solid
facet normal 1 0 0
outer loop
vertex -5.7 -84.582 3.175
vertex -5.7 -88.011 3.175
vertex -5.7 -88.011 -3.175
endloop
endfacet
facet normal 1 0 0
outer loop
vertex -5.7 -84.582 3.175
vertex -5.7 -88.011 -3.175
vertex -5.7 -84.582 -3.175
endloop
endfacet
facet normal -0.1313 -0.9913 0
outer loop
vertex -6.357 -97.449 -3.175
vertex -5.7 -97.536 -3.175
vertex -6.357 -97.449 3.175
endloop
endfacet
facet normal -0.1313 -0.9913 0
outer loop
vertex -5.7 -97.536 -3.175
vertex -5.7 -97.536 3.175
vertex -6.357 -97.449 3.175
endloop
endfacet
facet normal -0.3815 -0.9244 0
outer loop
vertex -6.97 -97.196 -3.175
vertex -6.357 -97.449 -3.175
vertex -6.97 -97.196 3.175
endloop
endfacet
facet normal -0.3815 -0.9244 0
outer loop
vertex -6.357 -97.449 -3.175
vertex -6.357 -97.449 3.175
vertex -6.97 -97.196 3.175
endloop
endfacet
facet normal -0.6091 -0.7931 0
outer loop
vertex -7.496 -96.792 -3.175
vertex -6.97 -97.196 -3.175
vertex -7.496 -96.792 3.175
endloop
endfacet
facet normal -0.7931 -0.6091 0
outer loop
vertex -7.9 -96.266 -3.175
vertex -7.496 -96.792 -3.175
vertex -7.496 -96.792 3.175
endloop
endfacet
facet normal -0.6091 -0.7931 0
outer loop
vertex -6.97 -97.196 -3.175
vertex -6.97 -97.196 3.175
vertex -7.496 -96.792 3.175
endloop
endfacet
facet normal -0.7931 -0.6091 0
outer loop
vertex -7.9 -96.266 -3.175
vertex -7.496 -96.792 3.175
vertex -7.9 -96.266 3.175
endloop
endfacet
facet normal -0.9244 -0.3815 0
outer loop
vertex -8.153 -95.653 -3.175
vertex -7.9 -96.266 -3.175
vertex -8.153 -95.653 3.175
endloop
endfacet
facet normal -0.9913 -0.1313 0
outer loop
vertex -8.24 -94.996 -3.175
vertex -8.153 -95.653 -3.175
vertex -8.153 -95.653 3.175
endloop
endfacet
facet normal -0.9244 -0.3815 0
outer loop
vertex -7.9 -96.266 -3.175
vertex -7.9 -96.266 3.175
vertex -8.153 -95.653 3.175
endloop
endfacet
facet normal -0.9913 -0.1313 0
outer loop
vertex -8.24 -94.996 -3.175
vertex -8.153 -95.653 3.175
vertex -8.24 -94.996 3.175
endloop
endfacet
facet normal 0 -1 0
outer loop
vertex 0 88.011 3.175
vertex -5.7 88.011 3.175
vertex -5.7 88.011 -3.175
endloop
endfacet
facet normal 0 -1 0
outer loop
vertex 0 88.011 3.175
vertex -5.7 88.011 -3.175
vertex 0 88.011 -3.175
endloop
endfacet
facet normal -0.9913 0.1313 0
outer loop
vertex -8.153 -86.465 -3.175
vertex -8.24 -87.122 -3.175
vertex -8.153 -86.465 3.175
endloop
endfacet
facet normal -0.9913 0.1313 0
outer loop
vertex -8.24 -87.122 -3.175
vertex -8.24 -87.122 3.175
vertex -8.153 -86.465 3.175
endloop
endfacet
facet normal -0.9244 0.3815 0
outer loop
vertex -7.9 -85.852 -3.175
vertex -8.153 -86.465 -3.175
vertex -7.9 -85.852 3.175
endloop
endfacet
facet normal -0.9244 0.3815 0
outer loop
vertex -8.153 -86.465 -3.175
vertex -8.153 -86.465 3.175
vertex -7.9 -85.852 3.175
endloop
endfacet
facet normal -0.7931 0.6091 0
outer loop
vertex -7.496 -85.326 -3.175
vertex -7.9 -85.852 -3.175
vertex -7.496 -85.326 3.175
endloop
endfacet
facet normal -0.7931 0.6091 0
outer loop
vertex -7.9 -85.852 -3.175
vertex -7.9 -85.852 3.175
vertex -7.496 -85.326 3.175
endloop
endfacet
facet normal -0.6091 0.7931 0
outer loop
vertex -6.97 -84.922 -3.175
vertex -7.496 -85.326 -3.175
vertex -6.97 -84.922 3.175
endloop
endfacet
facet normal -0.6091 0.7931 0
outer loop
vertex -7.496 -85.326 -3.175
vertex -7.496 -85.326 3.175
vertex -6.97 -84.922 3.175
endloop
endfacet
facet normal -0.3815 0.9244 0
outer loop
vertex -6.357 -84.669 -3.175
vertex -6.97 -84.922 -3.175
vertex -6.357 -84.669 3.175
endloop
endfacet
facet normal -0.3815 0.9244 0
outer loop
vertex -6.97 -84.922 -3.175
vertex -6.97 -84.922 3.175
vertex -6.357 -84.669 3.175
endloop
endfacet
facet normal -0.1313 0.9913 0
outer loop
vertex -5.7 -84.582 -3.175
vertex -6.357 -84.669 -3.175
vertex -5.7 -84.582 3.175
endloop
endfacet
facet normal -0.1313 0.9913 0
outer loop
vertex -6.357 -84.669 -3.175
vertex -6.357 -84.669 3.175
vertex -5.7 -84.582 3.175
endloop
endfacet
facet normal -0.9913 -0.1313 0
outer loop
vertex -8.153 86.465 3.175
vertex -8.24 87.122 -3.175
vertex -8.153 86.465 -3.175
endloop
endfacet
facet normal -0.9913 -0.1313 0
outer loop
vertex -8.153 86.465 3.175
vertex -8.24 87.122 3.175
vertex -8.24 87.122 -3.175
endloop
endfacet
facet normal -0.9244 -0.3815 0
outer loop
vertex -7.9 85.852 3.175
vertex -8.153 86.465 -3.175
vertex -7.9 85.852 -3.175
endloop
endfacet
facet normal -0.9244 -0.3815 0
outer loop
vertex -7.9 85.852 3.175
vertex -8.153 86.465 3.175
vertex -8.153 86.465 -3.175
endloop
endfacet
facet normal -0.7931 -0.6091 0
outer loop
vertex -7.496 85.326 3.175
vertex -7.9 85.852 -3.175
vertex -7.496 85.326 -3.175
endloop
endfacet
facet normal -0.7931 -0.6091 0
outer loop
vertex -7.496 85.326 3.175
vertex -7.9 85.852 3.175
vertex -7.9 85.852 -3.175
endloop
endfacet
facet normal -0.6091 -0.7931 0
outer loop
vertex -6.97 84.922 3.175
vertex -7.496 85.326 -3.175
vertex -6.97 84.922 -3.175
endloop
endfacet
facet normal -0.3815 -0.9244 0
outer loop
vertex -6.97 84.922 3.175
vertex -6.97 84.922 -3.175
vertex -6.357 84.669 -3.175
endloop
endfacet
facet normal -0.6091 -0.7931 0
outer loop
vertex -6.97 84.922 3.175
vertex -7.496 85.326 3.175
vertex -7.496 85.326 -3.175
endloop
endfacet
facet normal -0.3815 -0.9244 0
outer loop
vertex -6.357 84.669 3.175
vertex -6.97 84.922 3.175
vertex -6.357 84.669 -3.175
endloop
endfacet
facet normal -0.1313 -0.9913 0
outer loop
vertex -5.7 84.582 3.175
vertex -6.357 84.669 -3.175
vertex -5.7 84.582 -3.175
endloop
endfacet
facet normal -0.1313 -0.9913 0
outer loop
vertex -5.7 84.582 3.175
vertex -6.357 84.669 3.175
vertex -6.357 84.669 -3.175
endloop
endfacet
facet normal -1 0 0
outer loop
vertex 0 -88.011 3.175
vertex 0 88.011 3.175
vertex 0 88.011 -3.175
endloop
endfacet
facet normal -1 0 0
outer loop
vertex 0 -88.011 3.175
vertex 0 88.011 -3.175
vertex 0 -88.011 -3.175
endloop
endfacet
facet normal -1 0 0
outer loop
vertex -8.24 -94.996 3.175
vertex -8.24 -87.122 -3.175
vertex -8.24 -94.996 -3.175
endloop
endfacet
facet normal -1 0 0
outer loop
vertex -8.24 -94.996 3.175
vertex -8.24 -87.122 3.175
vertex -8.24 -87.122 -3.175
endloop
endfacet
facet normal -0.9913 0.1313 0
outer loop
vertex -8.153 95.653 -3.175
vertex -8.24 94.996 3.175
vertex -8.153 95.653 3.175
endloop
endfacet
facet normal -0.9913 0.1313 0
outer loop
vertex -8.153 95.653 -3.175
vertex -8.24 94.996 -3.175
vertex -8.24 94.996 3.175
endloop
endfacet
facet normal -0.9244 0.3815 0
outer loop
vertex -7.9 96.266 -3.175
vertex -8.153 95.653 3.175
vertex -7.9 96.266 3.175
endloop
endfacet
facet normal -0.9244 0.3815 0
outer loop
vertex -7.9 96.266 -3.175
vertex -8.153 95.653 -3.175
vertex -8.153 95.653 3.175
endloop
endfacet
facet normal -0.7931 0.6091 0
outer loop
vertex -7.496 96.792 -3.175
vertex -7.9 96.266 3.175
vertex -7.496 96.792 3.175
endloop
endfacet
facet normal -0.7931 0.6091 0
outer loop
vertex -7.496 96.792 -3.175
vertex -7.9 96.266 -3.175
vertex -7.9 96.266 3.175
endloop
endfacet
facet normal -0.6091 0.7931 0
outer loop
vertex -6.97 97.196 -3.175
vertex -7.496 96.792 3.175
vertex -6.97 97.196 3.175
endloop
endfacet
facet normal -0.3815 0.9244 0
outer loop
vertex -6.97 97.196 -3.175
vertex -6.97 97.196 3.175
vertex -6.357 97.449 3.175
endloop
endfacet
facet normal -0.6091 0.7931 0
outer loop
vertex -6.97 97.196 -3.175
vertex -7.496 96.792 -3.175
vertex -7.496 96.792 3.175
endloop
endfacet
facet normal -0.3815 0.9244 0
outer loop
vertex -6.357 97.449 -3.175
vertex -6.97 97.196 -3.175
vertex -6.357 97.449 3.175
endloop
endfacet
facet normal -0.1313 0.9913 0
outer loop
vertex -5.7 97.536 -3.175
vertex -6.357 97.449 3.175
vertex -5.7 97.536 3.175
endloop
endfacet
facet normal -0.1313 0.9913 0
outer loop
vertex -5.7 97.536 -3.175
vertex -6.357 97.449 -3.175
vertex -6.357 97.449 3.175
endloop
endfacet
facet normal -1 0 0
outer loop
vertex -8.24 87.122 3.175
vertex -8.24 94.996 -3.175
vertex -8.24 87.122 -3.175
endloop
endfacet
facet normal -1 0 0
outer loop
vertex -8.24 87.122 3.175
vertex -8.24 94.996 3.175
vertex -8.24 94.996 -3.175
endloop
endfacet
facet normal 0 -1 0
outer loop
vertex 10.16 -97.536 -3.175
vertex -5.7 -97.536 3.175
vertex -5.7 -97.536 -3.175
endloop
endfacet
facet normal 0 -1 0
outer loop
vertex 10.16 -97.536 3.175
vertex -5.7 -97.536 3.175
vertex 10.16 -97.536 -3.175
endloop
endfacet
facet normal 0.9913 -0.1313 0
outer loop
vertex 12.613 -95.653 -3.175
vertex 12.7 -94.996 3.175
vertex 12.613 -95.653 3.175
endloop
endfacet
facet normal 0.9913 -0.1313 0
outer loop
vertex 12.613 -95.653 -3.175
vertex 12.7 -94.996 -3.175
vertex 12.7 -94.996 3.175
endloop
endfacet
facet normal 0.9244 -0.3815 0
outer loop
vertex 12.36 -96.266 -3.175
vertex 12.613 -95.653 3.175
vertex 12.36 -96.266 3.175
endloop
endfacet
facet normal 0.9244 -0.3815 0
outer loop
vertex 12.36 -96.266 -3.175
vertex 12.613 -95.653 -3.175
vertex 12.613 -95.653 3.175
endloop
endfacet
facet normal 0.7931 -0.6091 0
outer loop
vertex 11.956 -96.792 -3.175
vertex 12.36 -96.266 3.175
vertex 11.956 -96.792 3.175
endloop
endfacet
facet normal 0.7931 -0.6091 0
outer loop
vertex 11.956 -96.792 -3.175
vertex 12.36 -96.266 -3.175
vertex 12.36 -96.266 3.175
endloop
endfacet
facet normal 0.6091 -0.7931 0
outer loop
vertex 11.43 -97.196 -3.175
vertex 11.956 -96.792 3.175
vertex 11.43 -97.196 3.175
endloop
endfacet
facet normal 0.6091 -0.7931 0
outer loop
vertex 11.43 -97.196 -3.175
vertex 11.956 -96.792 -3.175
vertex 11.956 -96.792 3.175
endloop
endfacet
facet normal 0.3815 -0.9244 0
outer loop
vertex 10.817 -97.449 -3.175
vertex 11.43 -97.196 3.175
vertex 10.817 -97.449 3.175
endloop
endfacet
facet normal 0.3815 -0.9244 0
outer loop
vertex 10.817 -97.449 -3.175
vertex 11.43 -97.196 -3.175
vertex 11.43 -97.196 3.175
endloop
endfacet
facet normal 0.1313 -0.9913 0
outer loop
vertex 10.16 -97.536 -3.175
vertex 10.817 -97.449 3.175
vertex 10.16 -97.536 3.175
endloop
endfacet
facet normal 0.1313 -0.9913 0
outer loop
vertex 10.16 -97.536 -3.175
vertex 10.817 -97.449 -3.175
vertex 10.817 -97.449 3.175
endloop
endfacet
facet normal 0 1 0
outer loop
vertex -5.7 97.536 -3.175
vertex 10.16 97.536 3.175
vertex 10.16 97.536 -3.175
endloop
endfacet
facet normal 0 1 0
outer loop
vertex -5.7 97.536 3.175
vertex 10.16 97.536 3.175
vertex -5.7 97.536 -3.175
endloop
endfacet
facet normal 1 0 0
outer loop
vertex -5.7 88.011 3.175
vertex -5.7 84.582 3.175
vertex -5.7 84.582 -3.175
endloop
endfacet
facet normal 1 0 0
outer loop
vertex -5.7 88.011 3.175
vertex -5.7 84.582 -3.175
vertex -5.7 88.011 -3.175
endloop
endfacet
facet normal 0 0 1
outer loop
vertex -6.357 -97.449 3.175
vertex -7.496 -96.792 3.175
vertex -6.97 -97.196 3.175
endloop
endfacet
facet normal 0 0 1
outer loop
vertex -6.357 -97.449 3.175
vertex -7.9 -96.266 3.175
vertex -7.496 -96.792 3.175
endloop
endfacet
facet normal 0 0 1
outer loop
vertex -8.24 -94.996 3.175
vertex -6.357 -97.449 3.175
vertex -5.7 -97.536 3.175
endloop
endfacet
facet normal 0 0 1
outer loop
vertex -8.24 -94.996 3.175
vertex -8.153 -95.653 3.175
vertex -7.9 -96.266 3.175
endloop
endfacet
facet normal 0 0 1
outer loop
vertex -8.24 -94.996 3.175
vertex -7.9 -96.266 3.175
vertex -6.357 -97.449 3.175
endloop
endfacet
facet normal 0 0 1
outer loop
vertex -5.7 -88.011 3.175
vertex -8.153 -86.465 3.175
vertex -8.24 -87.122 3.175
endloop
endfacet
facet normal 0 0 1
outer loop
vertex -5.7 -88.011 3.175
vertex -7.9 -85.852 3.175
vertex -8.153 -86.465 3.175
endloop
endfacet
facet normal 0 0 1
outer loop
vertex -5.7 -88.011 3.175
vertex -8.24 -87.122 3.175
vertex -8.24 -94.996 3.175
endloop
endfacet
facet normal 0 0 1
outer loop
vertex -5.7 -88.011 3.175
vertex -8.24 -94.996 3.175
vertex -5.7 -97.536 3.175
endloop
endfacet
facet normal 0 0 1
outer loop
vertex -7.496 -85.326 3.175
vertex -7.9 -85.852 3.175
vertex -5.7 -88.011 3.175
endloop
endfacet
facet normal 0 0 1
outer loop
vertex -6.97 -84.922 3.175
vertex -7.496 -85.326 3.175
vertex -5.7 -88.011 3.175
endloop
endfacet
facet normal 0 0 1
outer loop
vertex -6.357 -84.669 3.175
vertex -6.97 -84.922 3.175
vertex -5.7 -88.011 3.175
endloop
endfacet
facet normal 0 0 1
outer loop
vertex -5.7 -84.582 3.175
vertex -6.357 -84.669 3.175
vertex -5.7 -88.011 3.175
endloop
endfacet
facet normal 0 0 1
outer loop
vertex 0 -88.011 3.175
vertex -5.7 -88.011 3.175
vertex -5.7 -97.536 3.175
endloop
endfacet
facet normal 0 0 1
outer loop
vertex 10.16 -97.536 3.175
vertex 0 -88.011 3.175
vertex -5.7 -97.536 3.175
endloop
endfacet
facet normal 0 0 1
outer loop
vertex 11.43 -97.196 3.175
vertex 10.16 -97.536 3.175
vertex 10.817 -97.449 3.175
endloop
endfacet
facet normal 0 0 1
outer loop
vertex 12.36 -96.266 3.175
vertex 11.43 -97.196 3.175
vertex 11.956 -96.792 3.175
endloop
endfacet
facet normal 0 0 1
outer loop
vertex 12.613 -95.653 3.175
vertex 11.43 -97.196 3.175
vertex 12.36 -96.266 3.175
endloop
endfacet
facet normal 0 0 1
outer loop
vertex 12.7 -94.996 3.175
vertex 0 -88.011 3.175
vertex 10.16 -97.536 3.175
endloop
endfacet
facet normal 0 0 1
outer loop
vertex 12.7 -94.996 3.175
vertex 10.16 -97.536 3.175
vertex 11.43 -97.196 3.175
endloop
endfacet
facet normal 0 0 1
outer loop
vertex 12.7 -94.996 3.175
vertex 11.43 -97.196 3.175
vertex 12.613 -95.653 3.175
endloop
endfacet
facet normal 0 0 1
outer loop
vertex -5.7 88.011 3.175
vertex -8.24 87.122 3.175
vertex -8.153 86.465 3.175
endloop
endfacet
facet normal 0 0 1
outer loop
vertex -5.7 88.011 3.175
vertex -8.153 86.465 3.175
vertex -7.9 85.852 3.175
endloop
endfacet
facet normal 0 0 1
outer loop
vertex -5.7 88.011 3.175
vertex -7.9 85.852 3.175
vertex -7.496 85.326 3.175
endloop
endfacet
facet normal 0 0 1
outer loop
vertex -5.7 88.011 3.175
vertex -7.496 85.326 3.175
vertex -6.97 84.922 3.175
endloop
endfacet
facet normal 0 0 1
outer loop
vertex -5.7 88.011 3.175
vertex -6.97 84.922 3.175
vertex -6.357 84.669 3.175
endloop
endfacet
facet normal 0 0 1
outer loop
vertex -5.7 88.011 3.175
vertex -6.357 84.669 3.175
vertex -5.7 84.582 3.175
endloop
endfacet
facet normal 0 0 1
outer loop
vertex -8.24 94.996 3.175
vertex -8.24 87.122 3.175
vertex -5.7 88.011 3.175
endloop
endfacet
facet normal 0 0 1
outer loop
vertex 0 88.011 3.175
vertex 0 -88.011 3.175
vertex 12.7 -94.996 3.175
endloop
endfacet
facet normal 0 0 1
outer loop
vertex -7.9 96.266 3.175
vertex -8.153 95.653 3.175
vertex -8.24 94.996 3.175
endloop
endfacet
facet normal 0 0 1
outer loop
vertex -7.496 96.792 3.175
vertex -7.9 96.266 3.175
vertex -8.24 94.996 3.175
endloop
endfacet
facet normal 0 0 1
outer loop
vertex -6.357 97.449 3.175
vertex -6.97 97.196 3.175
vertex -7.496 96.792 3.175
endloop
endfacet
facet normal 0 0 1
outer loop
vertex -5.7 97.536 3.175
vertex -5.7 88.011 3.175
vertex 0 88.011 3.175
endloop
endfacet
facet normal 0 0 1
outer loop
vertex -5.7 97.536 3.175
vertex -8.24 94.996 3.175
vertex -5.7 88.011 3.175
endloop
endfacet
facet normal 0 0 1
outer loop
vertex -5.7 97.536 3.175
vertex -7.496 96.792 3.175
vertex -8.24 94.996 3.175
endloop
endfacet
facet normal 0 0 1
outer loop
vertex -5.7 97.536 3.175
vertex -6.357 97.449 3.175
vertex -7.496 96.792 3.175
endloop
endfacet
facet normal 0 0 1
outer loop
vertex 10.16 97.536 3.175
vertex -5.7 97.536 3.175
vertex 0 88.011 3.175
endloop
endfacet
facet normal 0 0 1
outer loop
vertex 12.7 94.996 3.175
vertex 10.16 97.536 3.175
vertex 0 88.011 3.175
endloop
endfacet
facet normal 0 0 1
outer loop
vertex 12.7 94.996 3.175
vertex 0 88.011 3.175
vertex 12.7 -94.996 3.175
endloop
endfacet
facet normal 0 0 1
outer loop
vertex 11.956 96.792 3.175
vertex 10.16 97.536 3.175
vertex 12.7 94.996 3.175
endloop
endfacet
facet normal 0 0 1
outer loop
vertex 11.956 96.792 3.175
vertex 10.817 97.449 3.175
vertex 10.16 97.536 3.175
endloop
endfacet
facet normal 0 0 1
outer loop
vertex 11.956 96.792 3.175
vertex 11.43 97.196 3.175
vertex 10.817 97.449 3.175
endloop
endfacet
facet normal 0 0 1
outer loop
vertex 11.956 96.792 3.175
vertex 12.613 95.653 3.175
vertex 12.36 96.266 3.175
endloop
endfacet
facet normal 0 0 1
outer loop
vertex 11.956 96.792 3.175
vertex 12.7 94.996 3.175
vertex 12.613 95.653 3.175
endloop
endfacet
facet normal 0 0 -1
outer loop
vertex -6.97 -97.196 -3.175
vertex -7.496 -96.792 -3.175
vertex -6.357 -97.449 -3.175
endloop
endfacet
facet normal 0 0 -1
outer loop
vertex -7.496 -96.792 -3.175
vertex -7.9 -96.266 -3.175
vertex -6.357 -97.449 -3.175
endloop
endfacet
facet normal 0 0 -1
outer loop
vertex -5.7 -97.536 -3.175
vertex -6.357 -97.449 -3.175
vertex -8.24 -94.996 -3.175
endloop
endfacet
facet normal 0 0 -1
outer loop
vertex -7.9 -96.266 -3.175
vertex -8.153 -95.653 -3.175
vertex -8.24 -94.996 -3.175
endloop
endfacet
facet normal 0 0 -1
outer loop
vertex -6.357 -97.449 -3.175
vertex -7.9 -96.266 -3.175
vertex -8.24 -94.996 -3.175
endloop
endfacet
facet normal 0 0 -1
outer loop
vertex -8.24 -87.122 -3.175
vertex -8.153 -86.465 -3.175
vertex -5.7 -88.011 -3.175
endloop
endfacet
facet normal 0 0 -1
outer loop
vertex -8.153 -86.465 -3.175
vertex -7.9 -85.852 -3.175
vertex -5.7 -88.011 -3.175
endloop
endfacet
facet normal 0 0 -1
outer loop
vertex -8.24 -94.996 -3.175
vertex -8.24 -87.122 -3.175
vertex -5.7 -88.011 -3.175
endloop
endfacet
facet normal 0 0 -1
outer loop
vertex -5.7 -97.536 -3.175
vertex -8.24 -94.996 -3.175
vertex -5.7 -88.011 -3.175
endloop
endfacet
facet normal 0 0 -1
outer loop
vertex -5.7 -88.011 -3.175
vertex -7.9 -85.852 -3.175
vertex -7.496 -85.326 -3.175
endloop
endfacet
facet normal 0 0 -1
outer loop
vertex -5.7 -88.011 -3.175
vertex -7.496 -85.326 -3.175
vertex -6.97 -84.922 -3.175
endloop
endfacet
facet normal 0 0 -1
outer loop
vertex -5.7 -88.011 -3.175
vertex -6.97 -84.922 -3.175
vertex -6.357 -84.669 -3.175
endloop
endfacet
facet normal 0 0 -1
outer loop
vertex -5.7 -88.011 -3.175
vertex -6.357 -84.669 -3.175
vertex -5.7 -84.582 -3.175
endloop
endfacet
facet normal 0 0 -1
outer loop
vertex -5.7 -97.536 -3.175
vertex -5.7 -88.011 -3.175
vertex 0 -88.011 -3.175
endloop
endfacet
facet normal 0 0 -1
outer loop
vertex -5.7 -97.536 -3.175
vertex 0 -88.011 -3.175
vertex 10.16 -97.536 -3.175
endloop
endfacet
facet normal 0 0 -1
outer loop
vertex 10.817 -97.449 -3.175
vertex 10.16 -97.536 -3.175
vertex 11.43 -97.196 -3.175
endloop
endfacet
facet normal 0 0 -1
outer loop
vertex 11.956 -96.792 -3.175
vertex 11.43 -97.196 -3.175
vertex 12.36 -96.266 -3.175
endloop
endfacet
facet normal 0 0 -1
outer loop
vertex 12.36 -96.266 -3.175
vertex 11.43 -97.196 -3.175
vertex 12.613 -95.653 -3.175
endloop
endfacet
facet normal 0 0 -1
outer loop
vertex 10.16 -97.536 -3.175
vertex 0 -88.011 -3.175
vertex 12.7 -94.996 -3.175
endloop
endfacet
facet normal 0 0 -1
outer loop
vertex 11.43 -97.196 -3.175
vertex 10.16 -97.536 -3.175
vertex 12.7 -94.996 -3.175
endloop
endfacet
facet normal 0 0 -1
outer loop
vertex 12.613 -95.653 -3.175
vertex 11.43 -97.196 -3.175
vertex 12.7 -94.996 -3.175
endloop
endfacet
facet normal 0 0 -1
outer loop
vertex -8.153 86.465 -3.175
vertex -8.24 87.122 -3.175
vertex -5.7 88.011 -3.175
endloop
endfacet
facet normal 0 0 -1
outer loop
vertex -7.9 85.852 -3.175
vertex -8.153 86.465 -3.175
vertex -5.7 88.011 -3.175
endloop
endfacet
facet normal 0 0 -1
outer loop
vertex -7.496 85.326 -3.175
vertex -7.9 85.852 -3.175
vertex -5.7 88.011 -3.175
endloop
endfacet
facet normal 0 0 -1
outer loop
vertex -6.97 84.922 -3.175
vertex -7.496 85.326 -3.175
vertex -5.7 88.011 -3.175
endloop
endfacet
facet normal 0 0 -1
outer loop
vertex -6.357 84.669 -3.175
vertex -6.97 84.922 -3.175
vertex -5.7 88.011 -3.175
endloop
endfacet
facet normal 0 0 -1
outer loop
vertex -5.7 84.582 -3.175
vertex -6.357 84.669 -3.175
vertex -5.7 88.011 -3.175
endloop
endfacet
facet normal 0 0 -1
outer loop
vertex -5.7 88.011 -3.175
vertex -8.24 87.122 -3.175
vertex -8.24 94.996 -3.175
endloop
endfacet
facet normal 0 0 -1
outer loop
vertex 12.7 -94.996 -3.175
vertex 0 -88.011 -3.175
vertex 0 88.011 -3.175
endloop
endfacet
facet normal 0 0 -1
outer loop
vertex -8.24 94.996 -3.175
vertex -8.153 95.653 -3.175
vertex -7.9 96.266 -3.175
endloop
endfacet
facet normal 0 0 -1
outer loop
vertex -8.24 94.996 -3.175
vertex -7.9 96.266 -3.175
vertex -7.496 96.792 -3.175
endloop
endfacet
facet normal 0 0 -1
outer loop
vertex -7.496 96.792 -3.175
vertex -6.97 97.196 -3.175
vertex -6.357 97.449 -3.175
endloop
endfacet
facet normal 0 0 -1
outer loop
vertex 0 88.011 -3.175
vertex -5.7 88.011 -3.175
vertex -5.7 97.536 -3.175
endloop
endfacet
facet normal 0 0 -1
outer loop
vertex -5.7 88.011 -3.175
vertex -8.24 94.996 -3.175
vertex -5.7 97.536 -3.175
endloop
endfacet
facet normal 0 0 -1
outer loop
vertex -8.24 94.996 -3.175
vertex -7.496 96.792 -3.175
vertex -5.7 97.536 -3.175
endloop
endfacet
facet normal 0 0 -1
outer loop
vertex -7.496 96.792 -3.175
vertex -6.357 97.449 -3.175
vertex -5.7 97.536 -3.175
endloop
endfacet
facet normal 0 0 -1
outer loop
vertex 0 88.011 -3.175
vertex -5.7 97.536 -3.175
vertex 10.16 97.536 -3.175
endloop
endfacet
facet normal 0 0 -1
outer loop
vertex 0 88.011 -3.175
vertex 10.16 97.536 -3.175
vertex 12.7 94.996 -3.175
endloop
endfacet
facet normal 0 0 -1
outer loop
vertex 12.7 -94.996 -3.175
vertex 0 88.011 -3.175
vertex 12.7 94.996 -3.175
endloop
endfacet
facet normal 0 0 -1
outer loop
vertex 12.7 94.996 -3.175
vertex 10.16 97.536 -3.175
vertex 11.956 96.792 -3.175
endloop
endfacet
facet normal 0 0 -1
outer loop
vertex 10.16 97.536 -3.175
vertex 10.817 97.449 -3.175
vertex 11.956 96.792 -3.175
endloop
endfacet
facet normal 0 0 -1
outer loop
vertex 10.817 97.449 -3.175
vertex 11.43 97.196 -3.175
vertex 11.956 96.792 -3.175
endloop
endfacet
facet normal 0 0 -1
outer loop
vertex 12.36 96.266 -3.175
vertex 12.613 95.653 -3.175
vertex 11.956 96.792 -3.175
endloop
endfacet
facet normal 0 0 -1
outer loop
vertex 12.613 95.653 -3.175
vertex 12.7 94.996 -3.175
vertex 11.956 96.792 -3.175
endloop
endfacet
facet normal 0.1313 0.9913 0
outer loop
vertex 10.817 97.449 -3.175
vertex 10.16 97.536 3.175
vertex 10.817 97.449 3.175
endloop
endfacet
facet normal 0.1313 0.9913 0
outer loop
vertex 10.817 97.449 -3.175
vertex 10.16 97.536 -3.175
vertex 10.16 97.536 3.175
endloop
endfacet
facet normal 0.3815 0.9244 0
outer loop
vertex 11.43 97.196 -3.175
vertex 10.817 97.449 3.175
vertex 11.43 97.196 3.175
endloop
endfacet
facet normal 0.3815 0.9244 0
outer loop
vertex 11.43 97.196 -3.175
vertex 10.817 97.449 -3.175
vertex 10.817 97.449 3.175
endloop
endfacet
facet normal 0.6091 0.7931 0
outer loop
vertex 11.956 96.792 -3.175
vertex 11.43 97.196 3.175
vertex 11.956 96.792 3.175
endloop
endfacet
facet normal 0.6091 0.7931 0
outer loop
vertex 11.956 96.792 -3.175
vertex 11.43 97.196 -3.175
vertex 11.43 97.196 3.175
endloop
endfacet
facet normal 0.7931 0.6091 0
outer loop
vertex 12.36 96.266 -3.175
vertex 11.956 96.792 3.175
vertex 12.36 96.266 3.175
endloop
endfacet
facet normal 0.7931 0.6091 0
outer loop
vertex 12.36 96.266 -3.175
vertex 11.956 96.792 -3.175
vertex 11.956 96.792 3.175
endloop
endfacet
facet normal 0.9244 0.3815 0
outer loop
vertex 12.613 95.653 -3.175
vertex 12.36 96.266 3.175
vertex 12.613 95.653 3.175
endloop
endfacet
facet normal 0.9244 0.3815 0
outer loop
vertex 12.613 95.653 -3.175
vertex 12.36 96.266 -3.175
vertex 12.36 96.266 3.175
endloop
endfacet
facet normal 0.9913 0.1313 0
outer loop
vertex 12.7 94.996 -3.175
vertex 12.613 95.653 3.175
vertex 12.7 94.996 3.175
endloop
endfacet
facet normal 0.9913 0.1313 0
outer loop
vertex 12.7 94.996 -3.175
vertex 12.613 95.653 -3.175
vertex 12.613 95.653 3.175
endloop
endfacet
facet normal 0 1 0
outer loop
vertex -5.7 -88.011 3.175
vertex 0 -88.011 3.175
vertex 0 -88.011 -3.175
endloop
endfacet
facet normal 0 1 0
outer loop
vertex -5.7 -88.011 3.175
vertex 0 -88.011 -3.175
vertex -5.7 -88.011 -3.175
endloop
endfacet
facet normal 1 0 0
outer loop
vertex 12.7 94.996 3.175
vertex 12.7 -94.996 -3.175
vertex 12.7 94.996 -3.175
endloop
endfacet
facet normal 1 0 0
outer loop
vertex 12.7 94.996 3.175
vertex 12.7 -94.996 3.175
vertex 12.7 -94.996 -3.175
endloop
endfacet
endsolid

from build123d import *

# Parameters (mm, degrees)
BOSS_EXTRUDE1_DEPTH = 3.175
FILLET1_R           = 2.54


with BuildPart() as part:
    # Sketch1 → Boss-Extrude1 (new, symmetric)
    with BuildSketch(Plane.XY):
        Polygon((-8.240014, 97.536), (-8.240014, 84.582), (-5.700014, 84.582), (-5.700014, 88.011), (0, 88.011), (0, -88.011), (-5.700014, -88.011), (-5.700014, -84.582), (-8.240014, -84.582), (-8.240014, -97.536), (12.7, -97.536), (12.7, 97.536), align=None)
    extrude(amount=BOSS_EXTRUDE1_DEPTH, both=True)

    # Fillet1
    fillet1_edges = [part.edges().sort_by_distance(p)[0] for p in [
        (12.7, -97.536, 0),
        (-8.240014, -97.536, 0),
        (-8.240014, -84.582, 0),
        (12.7, 97.536, 0),
        (-8.240014, 84.582, 0),
        (-8.240014, 97.536, 0),
    ]]
    fillet(fillet1_edges, radius=FILLET1_R - 0.0001)  # a hair under: the kernel refuses the full size


solid = part.part
